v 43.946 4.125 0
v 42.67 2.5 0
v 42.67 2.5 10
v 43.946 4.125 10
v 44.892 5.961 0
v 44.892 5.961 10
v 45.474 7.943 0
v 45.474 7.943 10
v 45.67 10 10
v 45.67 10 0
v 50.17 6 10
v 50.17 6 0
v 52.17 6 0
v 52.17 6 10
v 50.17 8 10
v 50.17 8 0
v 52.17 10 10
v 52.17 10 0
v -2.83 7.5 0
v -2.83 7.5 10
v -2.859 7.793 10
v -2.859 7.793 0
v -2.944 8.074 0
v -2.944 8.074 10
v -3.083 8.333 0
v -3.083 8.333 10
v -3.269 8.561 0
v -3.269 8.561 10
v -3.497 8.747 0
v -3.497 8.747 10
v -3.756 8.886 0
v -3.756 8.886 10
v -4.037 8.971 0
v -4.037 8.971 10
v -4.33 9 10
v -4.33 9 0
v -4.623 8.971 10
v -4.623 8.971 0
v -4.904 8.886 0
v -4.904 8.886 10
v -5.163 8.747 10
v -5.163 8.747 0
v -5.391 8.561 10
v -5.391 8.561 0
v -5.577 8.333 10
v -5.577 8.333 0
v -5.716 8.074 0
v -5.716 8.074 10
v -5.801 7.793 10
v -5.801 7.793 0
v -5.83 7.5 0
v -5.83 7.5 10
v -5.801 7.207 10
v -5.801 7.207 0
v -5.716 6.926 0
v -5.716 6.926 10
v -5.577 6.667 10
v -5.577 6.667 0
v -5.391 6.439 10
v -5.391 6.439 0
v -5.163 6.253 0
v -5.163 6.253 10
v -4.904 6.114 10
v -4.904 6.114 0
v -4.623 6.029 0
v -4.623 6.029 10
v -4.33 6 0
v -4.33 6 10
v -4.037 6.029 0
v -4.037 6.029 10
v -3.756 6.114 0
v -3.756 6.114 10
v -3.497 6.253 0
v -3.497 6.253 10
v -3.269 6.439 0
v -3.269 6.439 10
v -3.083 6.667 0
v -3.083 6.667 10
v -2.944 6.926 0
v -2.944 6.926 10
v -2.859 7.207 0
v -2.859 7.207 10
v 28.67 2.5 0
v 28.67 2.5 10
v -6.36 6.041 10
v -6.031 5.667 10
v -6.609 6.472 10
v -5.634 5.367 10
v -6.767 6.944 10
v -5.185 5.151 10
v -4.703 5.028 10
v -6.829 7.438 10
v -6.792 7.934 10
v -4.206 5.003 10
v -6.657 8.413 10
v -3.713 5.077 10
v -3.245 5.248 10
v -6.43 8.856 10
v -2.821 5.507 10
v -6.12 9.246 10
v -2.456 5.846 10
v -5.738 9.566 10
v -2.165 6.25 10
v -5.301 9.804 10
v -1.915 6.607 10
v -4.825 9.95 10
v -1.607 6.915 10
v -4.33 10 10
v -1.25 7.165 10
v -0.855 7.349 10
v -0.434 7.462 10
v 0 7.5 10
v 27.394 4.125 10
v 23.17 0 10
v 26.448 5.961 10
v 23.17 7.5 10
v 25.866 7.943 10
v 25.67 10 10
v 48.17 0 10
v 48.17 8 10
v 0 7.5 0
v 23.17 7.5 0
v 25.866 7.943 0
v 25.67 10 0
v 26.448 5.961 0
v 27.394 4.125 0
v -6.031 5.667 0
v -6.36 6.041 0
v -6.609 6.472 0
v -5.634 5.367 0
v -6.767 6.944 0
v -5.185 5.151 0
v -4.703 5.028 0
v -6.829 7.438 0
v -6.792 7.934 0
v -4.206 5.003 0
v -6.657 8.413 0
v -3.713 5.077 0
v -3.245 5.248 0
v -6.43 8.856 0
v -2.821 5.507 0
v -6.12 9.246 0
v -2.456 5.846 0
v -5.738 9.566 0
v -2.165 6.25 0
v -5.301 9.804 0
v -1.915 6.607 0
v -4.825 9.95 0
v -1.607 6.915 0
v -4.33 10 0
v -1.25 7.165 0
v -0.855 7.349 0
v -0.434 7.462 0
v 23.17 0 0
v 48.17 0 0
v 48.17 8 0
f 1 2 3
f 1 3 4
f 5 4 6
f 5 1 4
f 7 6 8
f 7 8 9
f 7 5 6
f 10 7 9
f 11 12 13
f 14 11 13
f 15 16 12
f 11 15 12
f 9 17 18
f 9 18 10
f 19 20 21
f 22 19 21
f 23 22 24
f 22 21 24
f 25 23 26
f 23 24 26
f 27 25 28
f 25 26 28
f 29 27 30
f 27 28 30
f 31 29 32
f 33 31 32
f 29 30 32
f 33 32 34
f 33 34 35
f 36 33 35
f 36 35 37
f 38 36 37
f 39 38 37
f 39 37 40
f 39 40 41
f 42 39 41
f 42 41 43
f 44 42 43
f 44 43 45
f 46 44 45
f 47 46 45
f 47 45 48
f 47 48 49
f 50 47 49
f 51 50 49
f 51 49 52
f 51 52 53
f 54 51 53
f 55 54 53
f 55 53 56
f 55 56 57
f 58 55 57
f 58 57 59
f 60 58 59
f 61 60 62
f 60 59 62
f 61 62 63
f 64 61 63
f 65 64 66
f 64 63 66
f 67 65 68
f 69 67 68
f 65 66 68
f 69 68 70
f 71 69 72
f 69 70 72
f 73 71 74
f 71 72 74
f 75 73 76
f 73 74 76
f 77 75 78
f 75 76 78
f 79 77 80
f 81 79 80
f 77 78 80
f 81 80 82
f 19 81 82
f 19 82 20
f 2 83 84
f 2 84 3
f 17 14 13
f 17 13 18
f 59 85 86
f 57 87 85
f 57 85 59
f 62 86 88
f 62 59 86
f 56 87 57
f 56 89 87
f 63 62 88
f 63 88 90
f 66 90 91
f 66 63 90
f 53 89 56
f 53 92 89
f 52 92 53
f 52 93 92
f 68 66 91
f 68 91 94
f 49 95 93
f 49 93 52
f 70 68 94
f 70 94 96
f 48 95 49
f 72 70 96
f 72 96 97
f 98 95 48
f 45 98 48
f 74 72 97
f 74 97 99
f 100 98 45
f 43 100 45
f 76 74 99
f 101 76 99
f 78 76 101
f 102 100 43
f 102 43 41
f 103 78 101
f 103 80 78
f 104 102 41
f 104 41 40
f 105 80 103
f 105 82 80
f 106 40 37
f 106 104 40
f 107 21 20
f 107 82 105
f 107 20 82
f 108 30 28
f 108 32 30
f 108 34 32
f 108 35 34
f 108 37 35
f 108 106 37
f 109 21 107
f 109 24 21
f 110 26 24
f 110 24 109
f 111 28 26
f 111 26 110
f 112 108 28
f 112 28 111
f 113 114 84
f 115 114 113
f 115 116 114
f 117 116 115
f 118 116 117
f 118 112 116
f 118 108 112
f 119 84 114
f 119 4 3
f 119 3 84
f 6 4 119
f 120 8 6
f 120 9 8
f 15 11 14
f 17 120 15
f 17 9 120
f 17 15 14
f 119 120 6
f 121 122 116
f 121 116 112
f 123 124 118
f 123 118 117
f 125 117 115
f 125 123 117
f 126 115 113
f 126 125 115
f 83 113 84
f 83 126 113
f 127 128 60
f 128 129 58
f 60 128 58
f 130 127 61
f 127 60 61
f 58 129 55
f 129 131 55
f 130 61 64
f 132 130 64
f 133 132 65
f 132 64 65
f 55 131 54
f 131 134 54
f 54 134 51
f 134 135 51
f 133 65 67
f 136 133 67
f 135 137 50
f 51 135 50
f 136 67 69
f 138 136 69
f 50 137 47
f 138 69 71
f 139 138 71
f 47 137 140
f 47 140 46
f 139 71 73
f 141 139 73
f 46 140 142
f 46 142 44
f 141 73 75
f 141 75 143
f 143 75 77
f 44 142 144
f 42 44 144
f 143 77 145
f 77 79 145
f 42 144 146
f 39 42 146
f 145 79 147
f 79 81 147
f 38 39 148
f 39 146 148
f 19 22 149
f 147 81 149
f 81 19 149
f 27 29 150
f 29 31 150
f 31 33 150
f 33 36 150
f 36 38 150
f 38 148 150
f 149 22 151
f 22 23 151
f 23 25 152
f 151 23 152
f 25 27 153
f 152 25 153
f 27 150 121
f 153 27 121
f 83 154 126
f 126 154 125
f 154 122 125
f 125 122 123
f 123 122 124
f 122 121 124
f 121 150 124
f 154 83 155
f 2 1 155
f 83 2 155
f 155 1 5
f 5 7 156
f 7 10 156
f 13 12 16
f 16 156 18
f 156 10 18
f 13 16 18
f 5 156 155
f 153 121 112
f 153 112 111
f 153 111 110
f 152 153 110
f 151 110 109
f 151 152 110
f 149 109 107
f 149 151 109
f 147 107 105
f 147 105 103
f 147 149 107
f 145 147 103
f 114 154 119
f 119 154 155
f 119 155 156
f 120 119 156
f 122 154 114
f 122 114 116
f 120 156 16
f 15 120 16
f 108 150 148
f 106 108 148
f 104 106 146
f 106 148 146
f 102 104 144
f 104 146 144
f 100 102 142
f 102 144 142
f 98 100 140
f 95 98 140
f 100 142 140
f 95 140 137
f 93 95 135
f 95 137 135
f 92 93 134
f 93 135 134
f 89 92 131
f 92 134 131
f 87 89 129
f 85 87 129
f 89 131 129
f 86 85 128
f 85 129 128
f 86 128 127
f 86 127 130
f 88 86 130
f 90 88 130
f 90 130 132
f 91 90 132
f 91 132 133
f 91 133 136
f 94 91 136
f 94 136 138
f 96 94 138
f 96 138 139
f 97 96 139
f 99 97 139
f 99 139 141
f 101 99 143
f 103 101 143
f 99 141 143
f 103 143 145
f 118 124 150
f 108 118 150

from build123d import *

# Parameters (mm, degrees)
PAD_DEPTH    = 10
PAD001_DEPTH = 10
SKETCH002_R  = 1.5
POCKET_DEPTH = 10.001


with BuildPart() as part:
    # Sketch → Pad (new body)
    with BuildSketch(Plane.XY):
        with BuildLine():
            ThreePointArc((25.669873, 10), (26.447689, 5.961126), (28.669873, 2.5))
            Line((28.669873, 2.5), (42.669873, 2.5))
            ThreePointArc((42.669873, 2.5), (44.892057, 5.961126), (45.669873, 10))
            Line((48.169873, 10), (45.669873, 10))
            Line((48.169873, 0), (48.169873, 10))
            Line((23.169873, 0), (48.169873, 0))
            Line((23.169873, 0), (23.169873, 7.5))
            Line((23.169873, 7.5), (0, 7.5))
            ThreePointArc((0, 7.5), (-1.25, 7.165064), (-2.165064, 6.25))
            ThreePointArc((-4.330127, 10), (-6.495191, 6.25), (-2.165064, 6.25))
            Line((-4.330127, 10), (23.169873, 10))
            Line((25.669873, 10), (23.169873, 10))
        make_face()
    extrude(amount=PAD_DEPTH)

    # Sketch001 (on Face12 of Pad) → Pad001 (join)
    with BuildSketch(Plane.XY.offset(10)):
        Polygon((48.169873, 10), (48.169873, 8), (50.169873, 8), (50.169873, 6), (52.169873, 6), (52.169873, 10), align=None)
    extrude(amount=-PAD001_DEPTH)

    # Sketch002 (on Face17 of Pad001) → Pocket (cut, through all)
    with BuildSketch(Plane.XY.offset(10)):
        with Locations((-4.330127, 7.5)):
            Circle(SKETCH002_R)
    extrude(amount=-POCKET_DEPTH, mode=Mode.SUBTRACT)


solid = part.part
